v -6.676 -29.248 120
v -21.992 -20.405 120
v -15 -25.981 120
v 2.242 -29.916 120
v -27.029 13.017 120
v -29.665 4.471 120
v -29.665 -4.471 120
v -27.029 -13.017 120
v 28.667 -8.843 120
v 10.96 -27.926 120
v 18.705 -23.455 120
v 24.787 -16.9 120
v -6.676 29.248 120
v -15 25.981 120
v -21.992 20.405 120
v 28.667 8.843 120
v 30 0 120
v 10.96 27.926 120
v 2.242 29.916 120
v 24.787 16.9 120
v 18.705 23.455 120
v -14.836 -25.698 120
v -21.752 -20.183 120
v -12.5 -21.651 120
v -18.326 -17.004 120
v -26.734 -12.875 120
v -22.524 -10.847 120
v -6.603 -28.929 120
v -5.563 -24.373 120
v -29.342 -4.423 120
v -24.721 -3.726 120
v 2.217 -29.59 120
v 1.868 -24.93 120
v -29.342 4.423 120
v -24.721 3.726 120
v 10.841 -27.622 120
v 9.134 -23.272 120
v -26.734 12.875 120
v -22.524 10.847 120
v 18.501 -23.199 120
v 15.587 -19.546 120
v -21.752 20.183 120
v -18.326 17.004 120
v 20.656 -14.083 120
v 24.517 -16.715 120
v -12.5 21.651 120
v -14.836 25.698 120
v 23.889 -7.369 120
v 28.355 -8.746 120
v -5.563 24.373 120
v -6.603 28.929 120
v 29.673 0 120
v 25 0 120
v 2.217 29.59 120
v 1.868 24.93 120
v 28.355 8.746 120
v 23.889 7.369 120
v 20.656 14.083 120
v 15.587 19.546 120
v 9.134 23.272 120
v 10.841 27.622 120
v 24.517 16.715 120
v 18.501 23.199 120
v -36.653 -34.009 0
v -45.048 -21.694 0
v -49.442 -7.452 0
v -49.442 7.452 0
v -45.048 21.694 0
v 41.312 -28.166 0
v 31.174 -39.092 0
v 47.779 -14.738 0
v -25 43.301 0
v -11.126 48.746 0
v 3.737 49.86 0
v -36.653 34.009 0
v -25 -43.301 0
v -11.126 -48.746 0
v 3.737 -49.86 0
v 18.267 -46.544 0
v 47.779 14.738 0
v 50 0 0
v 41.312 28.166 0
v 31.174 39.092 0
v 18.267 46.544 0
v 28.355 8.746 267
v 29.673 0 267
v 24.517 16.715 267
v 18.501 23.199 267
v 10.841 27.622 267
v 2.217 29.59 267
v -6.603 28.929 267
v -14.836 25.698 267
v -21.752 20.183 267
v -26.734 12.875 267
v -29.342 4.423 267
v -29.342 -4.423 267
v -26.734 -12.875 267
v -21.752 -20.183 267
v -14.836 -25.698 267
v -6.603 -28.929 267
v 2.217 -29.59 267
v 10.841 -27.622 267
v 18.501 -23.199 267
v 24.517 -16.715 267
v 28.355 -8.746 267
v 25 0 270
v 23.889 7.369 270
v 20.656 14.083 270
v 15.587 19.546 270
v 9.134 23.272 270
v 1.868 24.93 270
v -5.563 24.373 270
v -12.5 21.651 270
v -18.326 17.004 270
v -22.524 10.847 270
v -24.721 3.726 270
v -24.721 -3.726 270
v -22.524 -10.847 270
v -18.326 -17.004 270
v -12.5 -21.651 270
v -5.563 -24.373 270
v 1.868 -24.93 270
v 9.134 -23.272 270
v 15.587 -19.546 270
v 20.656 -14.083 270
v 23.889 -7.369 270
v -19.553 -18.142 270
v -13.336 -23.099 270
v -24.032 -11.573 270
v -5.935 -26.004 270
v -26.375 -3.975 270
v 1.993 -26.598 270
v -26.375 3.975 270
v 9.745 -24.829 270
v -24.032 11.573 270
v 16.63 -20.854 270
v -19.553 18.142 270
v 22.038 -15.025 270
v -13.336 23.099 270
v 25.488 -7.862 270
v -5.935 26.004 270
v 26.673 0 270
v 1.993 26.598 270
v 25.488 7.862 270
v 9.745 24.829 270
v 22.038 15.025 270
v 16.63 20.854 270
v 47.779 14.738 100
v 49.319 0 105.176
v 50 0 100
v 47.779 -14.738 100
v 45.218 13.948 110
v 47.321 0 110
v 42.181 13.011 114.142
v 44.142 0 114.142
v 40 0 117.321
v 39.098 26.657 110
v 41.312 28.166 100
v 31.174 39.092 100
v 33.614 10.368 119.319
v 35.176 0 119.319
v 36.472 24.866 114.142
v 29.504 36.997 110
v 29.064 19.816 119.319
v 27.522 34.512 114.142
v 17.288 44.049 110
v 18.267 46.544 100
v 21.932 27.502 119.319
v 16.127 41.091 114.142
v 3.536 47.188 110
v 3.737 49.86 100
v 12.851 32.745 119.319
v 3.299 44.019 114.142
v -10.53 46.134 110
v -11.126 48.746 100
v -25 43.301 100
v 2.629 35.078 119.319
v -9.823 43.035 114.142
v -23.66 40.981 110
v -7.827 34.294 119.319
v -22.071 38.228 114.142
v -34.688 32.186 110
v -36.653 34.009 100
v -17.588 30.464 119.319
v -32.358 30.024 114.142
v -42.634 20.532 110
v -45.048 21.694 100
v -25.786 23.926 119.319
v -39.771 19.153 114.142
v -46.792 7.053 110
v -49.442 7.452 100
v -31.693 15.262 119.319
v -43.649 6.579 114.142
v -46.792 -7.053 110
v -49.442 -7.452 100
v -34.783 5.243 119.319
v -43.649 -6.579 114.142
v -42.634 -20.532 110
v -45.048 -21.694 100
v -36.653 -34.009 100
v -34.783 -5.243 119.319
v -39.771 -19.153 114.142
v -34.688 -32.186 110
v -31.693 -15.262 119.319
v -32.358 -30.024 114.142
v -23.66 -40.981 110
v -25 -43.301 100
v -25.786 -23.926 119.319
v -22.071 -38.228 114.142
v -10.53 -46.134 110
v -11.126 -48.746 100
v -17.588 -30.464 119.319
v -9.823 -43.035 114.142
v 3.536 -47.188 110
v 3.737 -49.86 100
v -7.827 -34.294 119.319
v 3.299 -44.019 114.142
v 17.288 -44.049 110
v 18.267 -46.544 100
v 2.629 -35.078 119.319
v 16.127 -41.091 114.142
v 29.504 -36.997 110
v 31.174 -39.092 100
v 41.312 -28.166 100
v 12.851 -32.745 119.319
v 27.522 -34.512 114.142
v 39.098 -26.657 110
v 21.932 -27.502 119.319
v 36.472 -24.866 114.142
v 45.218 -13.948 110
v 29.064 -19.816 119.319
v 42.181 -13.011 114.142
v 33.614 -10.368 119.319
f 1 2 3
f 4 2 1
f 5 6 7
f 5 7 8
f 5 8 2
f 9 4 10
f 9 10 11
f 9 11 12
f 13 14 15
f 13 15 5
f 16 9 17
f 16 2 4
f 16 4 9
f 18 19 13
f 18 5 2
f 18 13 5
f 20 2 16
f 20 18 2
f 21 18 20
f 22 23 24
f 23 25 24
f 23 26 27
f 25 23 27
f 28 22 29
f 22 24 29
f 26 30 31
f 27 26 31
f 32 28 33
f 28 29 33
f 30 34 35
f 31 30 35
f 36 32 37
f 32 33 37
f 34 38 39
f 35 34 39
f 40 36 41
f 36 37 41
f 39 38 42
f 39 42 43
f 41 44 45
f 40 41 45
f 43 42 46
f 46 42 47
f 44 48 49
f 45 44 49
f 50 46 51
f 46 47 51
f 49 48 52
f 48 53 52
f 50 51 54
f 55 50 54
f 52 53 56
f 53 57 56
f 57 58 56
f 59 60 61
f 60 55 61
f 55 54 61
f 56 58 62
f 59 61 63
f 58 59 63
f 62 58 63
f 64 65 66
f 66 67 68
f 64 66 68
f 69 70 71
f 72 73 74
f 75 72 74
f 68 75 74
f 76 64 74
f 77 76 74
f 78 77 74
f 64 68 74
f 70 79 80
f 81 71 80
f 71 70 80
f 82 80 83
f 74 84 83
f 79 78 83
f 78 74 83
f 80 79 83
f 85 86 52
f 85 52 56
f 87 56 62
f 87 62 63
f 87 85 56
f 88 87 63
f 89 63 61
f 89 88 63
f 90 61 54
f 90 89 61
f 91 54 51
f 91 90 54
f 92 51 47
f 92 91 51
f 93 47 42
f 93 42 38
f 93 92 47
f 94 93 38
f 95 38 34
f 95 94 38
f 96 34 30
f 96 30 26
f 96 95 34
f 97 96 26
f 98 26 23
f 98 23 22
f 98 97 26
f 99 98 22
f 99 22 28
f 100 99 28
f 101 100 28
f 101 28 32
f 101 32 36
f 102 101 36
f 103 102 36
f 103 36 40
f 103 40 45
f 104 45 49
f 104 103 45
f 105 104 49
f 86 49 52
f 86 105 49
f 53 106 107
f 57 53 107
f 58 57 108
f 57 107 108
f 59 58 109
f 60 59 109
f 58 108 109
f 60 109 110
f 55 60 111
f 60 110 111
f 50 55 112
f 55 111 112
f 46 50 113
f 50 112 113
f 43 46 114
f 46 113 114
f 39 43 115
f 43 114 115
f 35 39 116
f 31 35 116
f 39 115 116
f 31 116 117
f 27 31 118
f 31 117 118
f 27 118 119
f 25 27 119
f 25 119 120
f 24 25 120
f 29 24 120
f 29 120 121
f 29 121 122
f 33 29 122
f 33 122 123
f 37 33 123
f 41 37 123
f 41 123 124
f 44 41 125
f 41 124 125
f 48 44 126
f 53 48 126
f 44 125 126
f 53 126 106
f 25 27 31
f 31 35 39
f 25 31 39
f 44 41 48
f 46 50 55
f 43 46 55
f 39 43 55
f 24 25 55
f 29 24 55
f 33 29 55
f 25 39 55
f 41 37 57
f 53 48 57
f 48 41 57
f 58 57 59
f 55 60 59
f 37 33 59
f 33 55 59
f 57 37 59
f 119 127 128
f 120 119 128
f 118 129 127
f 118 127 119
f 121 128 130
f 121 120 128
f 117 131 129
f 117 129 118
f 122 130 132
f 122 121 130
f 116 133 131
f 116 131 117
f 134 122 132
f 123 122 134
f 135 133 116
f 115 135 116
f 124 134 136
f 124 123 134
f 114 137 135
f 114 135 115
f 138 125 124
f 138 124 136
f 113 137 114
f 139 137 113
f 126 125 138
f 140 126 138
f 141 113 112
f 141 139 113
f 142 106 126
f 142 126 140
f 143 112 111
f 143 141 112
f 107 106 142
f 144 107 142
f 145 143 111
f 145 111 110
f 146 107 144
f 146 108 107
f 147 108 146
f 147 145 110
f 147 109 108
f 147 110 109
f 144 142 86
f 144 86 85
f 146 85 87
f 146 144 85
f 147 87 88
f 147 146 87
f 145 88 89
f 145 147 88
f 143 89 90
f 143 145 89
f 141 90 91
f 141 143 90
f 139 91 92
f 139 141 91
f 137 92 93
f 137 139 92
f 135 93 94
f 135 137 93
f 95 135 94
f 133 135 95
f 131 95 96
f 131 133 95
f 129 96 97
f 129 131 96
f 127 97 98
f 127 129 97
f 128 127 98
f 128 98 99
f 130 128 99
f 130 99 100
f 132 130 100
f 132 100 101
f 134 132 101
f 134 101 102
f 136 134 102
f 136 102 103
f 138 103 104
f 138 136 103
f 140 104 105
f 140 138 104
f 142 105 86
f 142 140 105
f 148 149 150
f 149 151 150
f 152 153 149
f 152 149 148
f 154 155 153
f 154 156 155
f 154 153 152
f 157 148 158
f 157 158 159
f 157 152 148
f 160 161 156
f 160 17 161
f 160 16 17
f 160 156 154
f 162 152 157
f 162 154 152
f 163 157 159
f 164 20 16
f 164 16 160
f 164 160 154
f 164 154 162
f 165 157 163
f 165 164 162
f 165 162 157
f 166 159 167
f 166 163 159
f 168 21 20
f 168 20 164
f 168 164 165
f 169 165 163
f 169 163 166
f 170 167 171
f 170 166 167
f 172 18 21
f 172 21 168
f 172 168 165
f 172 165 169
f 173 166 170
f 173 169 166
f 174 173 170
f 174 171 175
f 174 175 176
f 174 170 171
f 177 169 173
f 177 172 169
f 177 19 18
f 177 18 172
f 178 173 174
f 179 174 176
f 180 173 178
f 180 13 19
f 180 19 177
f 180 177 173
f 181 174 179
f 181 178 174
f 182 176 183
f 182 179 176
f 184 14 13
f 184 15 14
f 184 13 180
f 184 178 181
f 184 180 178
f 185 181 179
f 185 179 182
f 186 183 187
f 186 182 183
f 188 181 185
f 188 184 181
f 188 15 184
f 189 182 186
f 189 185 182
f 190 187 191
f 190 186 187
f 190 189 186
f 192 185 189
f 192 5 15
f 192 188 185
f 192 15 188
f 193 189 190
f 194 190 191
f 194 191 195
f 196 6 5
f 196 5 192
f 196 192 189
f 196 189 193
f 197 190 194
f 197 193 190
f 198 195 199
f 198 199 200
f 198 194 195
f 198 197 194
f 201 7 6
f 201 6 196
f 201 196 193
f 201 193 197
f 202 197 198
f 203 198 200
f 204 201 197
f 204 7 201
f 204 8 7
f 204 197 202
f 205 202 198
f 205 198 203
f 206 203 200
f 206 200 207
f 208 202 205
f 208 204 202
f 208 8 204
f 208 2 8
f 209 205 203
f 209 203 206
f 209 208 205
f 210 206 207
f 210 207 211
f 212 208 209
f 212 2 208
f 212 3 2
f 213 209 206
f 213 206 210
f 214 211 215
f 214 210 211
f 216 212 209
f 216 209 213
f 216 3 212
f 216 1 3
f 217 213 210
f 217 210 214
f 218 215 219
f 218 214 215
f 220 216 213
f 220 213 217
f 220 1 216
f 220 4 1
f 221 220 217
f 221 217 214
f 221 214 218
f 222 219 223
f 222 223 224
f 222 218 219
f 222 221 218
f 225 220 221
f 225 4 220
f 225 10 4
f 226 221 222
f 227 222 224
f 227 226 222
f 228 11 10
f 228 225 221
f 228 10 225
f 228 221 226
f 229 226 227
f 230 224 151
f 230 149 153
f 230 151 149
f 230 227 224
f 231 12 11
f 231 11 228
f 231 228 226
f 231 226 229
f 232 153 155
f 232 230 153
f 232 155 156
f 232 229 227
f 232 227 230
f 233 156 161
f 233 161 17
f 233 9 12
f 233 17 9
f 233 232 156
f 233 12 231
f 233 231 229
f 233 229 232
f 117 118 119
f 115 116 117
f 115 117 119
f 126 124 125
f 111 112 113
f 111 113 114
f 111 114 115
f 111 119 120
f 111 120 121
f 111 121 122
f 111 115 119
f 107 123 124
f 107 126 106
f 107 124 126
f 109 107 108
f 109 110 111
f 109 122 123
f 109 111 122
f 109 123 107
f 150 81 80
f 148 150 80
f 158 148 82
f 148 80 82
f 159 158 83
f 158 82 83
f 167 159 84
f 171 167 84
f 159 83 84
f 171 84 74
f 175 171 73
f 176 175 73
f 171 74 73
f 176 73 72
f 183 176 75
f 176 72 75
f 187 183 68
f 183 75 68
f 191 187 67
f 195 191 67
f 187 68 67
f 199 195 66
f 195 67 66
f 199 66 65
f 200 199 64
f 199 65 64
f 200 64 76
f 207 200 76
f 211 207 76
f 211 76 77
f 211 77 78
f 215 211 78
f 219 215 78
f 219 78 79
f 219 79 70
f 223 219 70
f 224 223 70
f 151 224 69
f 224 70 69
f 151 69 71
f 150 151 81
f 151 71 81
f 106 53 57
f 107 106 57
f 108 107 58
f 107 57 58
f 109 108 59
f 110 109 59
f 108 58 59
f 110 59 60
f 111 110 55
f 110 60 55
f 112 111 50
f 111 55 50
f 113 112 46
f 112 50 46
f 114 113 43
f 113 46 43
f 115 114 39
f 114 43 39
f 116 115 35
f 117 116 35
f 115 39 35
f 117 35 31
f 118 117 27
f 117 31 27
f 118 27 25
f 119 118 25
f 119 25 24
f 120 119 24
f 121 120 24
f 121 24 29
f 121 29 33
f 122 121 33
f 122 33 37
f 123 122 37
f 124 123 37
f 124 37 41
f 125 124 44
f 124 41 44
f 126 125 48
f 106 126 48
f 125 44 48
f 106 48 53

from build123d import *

# Parameters (mm, degrees)
F0_R     = 50
F1_DEPTH = 120
F2_R     = 25
F3_DEPTH = 150
F4_R     = 20
F5_R     = 29.672966
F5_R_2   = 25
F6_DEPTH = 150
F7_SIZE  = 3


with BuildPart() as f1:
    # F0 (on Top) → F1 (new body)
    with BuildSketch(Plane.XY):
        Circle(F0_R)
    extrude(amount=F1_DEPTH)

    # F4
    f4_edges = [f1.edges().sort_by_distance(p)[0] for p in [
        (-50, 0, 120),
    ]]
    fillet(f4_edges, radius=F4_R)


with BuildPart() as f3:
    # F2 (on face) → F3 (new body)
    with BuildSketch(Plane.XY.offset(120)):
        Circle(F2_R)
    extrude(amount=F3_DEPTH)


with BuildPart() as f6:
    # F5 (on face) → F6 (new body)
    with BuildSketch(Plane.XY.offset(270)):
        Circle(F5_R)
        Circle(F5_R_2, mode=Mode.SUBTRACT)
    extrude(amount=-F6_DEPTH)

    # F7
    f7_edges = [f6.edges().sort_by_distance(p)[0] for p in [
        (-29.672966, 0, 270),
    ]]
    chamfer(f7_edges, length=F7_SIZE)


solid = Compound([f1.part, f3.part, f6.part])
